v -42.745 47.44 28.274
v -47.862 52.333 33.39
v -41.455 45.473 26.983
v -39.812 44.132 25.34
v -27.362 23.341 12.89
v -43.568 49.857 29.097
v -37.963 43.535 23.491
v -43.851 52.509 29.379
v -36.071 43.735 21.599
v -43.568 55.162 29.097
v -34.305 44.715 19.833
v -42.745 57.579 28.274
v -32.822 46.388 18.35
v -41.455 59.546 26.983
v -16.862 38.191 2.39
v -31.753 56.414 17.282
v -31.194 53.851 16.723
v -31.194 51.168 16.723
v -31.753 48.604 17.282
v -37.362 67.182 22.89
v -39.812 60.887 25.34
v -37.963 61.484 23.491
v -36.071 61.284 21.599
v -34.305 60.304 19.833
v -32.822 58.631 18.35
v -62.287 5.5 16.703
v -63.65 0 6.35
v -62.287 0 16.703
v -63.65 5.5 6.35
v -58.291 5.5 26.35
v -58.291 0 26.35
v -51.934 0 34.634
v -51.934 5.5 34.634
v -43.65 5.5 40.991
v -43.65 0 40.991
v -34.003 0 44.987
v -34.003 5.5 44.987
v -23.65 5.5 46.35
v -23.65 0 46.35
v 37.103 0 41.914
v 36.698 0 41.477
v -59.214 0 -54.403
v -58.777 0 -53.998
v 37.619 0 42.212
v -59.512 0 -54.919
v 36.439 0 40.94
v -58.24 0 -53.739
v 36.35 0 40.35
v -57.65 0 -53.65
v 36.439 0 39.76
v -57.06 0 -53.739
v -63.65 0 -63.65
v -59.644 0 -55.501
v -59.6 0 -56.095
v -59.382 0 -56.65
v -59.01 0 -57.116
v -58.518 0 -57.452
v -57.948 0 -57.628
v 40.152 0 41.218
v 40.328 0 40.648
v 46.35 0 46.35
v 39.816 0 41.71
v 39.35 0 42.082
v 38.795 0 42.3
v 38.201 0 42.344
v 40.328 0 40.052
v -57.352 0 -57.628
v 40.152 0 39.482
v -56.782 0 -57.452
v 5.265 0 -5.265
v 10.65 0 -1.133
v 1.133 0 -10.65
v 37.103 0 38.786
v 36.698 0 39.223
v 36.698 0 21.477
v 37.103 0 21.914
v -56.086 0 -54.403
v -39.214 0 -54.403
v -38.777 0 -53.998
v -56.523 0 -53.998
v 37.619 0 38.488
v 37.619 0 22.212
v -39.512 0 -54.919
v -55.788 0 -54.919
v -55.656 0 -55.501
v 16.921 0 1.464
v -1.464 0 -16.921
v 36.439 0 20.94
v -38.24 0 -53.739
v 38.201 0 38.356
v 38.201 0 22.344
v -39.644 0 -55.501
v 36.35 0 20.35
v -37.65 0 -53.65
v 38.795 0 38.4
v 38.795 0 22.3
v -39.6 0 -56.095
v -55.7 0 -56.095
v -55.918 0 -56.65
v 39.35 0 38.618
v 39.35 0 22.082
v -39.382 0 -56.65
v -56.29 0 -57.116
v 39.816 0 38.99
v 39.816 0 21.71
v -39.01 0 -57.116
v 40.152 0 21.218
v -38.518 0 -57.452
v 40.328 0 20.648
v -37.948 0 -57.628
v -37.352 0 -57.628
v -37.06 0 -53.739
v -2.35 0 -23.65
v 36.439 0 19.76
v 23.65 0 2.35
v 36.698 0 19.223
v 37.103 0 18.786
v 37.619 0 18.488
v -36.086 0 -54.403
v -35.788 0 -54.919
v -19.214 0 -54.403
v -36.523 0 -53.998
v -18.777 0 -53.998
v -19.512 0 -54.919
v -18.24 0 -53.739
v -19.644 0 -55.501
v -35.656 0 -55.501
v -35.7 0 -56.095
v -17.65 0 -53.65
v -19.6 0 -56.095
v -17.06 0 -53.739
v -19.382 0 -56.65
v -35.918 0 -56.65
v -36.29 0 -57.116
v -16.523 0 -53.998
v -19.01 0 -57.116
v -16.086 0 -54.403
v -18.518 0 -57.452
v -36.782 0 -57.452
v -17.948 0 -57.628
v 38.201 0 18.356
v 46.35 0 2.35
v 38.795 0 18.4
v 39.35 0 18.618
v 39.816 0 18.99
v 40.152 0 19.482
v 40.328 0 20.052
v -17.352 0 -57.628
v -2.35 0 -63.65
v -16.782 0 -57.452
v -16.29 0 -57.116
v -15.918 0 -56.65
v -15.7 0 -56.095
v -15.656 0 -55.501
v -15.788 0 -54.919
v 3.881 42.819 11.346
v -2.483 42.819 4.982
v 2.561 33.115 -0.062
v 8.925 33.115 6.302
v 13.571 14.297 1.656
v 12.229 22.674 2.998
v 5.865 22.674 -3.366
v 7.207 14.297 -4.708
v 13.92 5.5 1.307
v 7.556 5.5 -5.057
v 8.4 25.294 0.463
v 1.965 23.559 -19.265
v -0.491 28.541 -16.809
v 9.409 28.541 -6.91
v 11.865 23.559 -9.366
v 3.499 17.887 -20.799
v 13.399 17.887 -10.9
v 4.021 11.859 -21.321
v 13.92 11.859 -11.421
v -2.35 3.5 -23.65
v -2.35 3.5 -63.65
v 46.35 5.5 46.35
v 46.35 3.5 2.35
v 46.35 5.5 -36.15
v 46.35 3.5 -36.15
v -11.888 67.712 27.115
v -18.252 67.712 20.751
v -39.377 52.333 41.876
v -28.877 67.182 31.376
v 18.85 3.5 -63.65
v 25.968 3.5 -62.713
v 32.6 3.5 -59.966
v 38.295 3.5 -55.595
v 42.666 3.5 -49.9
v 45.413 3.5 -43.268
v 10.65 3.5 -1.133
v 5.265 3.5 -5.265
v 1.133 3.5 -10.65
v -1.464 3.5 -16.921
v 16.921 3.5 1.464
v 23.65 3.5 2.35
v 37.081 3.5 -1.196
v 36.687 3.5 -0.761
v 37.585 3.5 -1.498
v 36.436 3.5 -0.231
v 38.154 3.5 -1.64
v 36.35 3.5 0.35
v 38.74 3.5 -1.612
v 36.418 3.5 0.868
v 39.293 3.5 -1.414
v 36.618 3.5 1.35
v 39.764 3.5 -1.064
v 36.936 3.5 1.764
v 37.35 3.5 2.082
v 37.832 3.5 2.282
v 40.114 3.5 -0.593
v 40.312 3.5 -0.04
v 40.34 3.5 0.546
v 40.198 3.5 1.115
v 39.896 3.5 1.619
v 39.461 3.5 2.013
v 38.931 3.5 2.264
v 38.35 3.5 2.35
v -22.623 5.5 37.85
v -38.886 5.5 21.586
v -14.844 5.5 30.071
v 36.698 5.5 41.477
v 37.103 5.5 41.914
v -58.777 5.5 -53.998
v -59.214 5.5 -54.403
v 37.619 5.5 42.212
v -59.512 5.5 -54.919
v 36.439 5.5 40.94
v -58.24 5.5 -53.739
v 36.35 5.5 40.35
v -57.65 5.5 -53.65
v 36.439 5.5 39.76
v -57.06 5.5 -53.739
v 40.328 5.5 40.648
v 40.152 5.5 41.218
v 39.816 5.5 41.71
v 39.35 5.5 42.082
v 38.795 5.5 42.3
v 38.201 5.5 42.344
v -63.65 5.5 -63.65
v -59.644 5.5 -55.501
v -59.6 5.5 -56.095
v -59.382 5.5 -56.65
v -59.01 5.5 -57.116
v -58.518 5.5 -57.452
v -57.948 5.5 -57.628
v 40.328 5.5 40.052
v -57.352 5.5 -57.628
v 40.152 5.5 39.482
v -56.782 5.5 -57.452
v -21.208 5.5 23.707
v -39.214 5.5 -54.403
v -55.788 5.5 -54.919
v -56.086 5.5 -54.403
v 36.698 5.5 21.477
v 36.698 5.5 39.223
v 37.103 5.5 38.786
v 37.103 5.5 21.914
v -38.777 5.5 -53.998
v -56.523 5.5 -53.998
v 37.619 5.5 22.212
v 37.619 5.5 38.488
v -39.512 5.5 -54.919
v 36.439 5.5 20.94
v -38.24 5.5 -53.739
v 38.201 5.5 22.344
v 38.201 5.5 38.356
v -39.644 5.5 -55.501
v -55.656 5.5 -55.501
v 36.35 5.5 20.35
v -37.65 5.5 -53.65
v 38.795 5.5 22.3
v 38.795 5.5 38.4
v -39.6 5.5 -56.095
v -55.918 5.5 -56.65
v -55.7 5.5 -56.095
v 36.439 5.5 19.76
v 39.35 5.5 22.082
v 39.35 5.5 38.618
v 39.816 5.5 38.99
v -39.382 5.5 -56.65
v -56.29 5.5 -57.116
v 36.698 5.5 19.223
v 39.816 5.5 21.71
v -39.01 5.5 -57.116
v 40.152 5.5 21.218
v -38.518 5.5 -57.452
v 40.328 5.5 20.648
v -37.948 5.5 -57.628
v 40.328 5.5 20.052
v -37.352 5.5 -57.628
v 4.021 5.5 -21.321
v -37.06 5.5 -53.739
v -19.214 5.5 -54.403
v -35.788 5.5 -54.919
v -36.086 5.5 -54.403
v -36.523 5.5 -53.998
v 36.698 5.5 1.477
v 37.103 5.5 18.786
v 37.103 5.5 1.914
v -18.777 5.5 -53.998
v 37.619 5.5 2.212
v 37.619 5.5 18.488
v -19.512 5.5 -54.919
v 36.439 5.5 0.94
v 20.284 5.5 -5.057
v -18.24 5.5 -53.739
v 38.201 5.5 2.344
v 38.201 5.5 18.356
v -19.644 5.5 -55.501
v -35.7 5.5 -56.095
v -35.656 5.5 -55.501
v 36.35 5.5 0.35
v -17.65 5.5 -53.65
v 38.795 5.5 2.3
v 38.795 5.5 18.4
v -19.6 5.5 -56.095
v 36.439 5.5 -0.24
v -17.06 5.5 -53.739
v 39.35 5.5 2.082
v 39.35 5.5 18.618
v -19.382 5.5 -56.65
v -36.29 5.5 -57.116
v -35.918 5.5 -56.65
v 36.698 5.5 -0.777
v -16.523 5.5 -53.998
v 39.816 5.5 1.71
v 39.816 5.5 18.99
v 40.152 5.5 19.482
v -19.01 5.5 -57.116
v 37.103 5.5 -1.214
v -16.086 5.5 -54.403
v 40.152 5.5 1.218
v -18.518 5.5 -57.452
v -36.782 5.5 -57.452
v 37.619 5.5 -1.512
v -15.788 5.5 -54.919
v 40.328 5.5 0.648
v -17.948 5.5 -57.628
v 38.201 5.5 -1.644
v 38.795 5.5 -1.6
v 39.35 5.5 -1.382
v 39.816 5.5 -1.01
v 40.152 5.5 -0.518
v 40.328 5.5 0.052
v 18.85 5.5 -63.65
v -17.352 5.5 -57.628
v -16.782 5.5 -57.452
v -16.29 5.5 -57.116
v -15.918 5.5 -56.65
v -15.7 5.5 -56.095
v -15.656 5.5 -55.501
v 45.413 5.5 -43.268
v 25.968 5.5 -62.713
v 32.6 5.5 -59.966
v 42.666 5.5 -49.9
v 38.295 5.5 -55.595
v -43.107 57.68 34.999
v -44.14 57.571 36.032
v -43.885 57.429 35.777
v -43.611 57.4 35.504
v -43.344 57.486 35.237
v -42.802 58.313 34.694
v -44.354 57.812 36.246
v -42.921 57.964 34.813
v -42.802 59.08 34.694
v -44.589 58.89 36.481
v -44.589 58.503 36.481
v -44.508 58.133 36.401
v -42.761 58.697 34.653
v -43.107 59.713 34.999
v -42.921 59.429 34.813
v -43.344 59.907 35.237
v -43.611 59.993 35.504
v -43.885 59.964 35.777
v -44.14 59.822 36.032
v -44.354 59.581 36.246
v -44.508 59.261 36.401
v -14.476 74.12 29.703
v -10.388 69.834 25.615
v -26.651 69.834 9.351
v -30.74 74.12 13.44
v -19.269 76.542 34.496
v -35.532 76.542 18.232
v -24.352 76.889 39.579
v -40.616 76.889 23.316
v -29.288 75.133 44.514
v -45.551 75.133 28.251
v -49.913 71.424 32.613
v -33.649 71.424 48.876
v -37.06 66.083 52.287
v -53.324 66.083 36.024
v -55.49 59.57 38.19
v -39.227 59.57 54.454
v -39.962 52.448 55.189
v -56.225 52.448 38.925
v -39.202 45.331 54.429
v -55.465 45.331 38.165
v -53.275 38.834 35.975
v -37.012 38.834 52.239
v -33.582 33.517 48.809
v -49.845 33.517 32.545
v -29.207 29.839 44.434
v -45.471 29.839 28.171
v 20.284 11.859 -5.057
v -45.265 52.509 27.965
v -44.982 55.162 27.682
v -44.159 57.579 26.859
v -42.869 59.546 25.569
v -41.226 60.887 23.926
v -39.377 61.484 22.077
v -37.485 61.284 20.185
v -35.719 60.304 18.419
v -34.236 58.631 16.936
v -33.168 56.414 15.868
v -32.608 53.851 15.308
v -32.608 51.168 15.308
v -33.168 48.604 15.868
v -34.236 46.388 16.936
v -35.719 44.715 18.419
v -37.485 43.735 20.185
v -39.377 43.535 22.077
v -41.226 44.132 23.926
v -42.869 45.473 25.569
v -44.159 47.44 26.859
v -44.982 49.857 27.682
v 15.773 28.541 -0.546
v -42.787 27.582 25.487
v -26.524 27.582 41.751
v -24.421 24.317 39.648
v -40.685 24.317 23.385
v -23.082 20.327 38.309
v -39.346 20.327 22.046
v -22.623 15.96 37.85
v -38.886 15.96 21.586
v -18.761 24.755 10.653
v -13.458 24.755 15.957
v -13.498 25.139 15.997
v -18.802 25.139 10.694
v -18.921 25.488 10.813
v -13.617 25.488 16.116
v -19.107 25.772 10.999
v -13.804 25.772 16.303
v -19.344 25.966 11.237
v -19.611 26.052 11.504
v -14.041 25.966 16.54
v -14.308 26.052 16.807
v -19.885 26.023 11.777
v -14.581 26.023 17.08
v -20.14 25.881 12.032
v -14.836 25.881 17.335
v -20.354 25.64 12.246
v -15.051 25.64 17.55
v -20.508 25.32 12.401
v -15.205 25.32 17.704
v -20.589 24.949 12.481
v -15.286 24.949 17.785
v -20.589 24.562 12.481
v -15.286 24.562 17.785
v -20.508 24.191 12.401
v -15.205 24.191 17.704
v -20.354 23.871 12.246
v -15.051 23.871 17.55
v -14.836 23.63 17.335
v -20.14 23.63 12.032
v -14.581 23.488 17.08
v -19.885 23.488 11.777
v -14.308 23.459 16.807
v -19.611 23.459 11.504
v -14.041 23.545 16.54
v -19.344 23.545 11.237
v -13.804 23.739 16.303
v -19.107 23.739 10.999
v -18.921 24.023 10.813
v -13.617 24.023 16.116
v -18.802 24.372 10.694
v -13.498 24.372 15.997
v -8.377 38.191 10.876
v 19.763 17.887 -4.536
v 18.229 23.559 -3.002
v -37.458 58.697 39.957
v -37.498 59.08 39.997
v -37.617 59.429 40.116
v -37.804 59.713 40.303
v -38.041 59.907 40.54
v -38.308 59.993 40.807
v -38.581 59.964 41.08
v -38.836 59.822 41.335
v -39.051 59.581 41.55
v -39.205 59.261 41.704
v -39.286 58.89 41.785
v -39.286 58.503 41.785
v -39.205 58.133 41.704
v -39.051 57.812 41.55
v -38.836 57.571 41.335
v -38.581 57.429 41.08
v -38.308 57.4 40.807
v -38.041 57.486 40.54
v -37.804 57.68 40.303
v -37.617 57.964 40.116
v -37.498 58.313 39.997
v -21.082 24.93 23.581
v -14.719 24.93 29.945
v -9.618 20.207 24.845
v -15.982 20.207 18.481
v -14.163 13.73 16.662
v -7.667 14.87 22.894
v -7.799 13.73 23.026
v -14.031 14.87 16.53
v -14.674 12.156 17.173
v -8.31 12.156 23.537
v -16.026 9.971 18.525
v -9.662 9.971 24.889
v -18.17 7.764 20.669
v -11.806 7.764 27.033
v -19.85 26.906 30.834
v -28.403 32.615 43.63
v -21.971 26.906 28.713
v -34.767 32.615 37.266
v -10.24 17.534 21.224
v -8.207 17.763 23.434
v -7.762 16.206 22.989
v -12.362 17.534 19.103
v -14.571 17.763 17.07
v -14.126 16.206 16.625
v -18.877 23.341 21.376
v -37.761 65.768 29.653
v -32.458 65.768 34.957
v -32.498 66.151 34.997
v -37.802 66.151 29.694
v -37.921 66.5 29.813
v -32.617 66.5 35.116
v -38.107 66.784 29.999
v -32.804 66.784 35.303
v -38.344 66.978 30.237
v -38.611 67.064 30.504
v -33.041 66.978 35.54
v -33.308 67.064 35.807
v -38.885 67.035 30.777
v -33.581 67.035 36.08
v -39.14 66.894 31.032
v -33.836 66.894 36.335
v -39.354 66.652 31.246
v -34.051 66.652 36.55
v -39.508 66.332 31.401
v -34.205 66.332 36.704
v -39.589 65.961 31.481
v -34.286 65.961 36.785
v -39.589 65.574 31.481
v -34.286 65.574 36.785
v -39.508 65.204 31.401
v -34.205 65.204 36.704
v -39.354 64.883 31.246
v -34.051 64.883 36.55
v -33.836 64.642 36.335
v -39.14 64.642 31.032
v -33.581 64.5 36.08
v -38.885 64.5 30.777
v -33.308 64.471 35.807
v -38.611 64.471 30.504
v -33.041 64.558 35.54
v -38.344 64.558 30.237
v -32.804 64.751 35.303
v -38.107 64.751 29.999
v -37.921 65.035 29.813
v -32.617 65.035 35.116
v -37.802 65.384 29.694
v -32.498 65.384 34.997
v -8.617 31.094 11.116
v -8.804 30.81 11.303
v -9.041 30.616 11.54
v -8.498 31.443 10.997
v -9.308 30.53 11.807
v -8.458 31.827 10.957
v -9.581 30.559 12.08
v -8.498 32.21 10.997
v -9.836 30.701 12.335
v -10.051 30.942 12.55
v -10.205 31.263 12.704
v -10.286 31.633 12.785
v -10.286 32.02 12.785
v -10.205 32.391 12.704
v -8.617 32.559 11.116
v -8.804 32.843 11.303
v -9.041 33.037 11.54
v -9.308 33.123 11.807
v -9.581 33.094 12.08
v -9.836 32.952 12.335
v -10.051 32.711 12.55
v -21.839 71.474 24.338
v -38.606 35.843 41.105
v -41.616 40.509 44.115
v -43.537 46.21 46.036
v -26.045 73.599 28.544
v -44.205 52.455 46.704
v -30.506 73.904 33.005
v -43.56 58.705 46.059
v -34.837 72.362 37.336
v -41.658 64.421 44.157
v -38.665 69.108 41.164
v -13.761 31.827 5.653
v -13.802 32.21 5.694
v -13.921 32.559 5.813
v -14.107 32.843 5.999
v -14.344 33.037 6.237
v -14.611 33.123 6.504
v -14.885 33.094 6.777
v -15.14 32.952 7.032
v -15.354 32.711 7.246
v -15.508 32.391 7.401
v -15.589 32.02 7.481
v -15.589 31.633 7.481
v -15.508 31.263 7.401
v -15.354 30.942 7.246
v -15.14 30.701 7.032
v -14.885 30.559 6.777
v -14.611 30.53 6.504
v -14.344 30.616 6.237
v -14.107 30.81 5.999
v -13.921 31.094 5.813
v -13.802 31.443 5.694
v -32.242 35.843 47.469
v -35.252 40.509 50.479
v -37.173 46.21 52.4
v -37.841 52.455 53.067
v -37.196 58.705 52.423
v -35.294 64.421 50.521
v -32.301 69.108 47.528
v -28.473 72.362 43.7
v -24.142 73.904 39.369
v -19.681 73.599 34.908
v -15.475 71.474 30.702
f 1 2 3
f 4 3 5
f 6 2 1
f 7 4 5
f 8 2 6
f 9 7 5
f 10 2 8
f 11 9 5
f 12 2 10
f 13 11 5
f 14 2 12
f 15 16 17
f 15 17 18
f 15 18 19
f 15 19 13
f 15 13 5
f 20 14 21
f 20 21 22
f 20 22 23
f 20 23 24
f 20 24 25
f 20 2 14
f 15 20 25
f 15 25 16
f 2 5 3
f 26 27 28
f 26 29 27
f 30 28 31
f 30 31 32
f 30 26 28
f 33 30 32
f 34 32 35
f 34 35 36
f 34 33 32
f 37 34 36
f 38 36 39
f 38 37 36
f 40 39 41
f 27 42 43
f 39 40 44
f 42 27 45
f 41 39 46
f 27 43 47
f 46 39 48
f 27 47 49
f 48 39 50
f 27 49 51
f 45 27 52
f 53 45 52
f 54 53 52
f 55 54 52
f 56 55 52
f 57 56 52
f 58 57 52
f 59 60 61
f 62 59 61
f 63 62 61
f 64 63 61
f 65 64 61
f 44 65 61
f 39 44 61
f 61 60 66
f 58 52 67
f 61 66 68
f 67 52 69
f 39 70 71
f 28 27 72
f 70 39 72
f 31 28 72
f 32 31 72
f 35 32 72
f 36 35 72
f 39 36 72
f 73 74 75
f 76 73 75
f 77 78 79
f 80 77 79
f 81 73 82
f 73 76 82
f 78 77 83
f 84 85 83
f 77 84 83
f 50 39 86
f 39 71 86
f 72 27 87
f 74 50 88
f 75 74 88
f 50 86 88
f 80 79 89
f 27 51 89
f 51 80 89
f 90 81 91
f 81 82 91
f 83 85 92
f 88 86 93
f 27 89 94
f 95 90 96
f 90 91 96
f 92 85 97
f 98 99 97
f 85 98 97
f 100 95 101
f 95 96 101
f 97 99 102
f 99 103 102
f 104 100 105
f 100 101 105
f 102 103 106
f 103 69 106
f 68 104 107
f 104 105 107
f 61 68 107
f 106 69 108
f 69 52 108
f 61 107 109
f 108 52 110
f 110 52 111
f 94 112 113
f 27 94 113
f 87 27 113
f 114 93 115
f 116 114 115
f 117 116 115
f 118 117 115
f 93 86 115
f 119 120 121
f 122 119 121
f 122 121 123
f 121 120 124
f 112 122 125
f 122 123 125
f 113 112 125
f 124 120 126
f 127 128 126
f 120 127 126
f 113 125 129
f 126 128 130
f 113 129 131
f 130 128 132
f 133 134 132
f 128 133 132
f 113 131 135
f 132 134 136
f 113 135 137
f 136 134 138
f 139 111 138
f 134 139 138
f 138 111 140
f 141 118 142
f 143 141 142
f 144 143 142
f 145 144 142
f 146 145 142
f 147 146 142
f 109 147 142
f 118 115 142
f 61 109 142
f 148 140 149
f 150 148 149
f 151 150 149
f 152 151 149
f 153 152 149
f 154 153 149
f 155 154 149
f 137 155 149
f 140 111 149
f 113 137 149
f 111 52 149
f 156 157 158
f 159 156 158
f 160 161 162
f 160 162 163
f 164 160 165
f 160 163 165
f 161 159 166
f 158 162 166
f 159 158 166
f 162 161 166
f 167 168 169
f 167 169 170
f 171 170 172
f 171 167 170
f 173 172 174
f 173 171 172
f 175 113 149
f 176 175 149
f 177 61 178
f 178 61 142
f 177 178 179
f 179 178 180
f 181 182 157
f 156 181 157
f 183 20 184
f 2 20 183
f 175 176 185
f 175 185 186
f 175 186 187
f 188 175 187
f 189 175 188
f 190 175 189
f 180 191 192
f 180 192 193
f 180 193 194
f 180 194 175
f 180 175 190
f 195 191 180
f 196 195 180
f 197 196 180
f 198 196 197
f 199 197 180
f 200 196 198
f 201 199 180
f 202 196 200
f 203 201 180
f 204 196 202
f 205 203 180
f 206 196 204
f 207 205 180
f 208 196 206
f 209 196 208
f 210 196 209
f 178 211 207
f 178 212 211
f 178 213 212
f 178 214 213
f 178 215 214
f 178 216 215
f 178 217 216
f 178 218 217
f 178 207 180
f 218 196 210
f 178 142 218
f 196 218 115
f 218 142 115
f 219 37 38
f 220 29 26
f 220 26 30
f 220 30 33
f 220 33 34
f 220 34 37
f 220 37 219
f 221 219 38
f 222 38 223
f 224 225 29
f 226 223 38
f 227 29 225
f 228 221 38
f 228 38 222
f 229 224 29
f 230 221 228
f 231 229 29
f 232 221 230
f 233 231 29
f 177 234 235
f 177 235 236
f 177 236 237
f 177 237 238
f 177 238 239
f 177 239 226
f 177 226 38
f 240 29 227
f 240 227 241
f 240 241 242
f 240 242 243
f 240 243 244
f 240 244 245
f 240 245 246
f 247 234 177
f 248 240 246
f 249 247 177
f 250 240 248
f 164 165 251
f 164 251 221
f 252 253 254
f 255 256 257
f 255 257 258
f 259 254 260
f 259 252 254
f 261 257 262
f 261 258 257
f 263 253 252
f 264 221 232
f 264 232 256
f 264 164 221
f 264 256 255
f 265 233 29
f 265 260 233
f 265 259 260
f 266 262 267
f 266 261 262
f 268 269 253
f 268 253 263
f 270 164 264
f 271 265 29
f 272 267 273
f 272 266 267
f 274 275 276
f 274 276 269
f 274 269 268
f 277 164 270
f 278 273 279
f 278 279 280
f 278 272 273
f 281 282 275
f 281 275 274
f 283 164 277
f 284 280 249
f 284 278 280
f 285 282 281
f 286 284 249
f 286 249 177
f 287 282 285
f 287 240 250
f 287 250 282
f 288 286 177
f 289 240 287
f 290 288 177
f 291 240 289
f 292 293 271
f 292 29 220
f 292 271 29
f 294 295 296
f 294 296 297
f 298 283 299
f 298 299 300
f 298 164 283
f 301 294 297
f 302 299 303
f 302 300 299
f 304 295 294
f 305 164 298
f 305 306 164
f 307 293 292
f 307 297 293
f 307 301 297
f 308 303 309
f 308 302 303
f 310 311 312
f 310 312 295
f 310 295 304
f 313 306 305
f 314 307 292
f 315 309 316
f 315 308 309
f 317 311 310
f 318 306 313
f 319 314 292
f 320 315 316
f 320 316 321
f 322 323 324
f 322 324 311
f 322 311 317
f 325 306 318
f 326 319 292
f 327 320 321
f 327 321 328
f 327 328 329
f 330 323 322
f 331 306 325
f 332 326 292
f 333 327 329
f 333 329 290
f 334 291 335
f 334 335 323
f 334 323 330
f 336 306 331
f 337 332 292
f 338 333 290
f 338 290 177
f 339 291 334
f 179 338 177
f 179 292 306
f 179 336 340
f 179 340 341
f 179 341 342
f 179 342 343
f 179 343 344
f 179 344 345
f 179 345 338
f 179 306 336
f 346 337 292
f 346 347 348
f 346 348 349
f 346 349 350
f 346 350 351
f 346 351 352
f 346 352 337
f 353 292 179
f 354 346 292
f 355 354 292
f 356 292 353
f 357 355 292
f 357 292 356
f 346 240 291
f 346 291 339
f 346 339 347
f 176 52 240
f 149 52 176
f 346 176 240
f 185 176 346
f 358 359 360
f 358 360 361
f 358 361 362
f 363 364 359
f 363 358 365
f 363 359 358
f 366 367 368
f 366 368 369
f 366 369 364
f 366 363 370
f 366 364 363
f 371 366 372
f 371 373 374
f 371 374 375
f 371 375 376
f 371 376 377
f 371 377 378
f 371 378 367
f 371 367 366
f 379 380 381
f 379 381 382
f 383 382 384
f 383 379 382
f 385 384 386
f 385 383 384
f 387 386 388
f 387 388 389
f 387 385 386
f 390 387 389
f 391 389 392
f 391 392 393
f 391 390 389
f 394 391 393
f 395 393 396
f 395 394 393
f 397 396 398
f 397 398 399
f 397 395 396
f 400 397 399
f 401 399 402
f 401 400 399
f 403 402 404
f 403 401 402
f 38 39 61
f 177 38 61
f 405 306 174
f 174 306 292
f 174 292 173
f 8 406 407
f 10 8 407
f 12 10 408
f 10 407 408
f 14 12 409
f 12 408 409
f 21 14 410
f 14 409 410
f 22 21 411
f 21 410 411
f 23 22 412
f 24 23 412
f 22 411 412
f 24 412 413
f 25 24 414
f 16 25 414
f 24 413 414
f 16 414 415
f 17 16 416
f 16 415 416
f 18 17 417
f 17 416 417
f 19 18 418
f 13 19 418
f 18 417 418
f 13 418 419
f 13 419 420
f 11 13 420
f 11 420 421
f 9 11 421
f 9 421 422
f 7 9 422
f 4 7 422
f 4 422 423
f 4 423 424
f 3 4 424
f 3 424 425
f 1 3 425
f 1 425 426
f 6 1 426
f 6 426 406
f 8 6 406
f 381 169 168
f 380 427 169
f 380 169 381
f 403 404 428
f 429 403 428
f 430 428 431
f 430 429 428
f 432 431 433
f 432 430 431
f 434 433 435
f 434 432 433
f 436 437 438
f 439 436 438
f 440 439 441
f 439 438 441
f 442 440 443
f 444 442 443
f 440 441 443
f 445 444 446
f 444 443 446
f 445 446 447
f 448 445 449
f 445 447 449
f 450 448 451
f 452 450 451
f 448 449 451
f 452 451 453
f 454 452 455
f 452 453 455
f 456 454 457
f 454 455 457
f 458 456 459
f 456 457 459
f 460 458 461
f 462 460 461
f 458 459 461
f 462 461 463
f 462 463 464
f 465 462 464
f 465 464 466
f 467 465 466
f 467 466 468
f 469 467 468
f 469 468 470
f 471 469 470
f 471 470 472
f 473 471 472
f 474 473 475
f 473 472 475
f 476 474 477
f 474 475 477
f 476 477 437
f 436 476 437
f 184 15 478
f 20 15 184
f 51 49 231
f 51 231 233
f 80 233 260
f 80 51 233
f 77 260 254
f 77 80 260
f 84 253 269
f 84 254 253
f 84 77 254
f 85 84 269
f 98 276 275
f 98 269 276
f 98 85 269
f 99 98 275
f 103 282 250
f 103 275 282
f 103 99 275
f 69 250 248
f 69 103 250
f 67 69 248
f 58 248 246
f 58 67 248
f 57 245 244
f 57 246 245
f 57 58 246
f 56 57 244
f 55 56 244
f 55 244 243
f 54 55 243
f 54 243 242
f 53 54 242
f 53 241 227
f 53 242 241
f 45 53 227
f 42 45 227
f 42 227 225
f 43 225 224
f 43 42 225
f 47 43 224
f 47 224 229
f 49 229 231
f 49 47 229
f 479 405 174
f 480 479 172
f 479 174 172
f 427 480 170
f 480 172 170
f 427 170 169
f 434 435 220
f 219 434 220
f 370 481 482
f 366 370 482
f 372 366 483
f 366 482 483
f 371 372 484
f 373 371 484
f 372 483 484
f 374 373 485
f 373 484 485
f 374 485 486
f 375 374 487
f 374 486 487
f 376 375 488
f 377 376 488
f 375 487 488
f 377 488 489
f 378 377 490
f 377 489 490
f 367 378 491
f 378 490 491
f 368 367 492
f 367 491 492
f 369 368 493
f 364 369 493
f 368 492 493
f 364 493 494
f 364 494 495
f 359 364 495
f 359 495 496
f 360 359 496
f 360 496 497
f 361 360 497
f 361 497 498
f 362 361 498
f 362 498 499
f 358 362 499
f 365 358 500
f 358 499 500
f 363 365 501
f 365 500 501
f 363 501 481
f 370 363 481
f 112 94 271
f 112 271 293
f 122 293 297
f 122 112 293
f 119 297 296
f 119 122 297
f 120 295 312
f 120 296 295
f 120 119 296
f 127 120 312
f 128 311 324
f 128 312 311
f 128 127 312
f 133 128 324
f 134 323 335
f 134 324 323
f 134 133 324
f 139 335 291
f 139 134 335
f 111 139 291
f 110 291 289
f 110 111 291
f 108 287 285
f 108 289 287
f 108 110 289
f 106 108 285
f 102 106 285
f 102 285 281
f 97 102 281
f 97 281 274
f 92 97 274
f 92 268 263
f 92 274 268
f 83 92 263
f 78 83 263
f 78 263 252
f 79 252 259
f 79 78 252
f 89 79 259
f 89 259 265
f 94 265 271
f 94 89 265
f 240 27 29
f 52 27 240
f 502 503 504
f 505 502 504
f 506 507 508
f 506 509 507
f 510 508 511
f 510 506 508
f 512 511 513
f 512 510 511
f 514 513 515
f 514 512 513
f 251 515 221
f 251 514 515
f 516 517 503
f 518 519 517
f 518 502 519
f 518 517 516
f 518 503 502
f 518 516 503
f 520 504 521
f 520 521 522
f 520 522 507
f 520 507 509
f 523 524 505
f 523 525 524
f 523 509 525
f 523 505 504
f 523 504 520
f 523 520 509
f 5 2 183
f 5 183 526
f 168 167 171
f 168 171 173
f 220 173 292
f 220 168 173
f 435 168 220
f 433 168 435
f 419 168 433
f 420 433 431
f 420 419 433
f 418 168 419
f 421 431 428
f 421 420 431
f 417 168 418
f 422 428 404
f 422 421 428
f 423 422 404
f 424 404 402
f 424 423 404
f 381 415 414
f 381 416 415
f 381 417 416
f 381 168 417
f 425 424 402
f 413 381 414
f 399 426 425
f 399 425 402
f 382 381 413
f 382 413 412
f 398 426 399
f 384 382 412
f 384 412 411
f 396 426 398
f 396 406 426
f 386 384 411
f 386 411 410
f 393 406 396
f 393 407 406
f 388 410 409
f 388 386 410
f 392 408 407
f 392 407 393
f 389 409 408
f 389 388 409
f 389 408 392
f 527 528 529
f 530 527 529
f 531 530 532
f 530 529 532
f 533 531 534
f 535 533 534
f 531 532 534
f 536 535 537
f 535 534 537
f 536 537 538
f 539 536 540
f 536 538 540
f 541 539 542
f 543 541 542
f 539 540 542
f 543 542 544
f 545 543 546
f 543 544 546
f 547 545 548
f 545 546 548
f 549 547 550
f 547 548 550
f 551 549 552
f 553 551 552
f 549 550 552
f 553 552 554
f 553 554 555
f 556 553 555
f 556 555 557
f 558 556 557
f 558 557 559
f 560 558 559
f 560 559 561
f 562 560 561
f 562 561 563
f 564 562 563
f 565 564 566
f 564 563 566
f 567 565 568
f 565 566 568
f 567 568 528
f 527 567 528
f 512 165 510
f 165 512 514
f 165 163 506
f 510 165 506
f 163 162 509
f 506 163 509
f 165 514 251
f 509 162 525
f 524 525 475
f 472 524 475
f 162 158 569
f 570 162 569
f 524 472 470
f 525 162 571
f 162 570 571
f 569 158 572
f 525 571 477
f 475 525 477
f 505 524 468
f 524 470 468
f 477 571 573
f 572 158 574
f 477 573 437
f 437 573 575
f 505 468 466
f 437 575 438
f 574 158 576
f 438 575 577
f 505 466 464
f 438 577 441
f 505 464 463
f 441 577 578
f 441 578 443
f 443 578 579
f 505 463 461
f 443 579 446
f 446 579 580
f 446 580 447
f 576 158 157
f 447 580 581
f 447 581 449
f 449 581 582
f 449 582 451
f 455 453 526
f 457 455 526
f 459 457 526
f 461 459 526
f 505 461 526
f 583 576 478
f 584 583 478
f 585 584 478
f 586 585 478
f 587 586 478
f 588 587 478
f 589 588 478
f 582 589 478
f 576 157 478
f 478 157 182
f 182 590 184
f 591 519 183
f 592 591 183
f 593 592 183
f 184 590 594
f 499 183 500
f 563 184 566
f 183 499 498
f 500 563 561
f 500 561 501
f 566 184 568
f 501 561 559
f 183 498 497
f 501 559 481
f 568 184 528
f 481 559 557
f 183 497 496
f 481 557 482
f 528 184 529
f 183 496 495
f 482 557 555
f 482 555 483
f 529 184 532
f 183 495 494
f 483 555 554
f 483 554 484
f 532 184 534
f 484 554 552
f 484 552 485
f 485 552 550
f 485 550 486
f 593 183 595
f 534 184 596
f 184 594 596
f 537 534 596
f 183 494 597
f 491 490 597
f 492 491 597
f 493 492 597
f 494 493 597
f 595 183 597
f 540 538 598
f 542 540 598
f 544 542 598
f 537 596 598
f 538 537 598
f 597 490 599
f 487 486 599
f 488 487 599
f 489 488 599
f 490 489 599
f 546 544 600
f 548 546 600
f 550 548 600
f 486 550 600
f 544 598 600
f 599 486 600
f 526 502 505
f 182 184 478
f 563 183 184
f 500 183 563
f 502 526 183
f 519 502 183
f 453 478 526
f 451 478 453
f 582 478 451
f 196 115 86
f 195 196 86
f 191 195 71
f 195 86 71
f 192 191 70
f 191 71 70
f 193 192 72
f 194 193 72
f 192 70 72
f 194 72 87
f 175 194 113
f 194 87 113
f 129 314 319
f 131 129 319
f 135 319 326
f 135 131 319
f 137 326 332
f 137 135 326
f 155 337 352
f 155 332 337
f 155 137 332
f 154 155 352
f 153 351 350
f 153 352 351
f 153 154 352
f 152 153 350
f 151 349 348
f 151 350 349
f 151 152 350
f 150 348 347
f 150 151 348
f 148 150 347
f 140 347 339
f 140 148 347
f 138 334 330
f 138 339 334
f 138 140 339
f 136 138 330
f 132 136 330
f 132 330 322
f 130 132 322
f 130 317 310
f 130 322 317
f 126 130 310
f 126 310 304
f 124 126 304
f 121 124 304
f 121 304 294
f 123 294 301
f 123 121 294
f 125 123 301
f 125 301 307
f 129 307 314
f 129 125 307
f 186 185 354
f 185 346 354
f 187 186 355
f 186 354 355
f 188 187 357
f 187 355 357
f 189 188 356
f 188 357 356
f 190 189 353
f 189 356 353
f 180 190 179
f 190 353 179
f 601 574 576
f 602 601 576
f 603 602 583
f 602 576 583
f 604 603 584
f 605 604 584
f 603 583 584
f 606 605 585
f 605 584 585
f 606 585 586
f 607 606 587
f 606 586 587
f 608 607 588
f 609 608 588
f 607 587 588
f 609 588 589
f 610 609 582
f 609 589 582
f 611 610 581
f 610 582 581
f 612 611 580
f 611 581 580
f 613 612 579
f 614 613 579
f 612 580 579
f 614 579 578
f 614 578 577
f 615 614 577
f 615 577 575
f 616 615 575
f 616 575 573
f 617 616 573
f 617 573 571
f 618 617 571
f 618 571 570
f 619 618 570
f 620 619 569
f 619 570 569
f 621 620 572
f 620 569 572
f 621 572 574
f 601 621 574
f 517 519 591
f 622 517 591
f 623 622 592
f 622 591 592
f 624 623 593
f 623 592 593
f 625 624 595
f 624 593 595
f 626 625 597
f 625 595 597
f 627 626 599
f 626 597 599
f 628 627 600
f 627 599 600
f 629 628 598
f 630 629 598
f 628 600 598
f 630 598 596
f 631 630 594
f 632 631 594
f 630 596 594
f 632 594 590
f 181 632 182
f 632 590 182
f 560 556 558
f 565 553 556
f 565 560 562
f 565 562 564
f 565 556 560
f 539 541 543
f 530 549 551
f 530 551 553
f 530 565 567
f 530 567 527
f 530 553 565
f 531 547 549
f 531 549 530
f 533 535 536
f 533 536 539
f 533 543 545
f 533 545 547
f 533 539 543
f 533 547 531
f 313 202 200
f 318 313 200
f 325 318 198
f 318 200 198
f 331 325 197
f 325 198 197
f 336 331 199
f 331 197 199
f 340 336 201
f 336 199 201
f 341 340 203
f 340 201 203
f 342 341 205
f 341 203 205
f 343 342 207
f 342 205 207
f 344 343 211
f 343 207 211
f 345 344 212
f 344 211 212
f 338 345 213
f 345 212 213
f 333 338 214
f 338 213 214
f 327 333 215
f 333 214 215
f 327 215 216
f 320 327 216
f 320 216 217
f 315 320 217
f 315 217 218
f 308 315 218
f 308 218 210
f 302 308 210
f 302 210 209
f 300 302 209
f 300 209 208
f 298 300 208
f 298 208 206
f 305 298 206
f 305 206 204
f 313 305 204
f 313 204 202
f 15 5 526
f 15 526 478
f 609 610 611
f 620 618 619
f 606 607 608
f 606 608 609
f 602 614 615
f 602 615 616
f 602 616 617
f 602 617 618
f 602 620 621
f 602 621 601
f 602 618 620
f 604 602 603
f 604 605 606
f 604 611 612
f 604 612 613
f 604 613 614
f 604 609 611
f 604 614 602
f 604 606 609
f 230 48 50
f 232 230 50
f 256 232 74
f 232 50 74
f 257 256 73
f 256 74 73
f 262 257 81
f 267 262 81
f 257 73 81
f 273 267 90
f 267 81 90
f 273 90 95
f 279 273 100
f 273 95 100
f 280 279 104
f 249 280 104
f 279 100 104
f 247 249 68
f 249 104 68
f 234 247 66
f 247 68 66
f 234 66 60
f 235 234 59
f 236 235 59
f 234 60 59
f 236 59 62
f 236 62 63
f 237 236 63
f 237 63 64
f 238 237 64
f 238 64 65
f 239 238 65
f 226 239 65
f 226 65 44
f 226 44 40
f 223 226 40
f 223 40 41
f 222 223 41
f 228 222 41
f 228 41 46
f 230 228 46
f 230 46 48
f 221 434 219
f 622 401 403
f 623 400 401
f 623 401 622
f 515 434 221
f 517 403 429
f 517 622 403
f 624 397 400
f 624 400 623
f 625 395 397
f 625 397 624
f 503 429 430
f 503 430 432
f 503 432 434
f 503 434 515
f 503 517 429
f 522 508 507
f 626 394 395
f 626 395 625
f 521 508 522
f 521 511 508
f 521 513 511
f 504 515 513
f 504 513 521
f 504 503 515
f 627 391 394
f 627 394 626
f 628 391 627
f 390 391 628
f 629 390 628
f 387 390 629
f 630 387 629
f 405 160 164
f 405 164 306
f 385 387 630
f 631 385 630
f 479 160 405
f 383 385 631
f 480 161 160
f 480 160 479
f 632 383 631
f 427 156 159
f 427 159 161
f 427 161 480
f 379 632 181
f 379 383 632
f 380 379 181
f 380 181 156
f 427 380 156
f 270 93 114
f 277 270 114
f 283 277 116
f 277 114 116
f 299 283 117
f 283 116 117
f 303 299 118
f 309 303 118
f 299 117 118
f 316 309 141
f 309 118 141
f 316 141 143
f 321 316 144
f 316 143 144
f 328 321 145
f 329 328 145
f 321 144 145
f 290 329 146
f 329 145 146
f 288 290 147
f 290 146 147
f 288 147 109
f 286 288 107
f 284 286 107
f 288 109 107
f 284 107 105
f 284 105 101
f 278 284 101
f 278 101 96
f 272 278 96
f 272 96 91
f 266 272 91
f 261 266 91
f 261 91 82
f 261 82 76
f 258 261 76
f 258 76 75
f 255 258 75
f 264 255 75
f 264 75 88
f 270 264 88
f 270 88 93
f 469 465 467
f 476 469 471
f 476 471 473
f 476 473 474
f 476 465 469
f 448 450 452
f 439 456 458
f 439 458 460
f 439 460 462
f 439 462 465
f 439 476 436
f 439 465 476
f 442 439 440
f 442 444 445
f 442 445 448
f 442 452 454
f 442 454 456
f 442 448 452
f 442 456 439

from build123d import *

# Parameters (mm, degrees)
SKETCH2_W                       = 110
SKETCH2_H                       = 110
BOSS_EXTRUDE1_DEPTH             = 5.5
BOSS_EXTRUDE2_DEPTH             = 14
CUT_EXTRUDE5_REACH              = 110.823
SKETCH9_R                       = 1.3
CUT_EXTRUDE6_DEPTH              = 7.5
CUT_EXTRUDE9_REACH              = 109.547
SKETCH11_R                      = 9
BOSS_EXTRUDE7_DEPTH             = 9
BOSS_EXTRUDE7_DIRECTION_2_REACH = 119.904
BOSS_EXTRUDE10_DEPTH            = 9
CUT_EXTRUDE10_DEPTH             = 3.5
F_4_0_4_DIAMETER_HOLE3_D        = 4
FILLET1_R                       = 27.5
FILLET2_R                       = 40


with BuildPart() as part:
    # Sketch2 → Boss-Extrude1 (new body)
    with BuildSketch(Plane(origin=(0, 0, 0), x_dir=(1, 0, 0), z_dir=(0, 1, 0))):
        with Locations((-8.65, 8.65)):
            Rectangle(SKETCH2_W, SKETCH2_H)
    extrude(amount=BOSS_EXTRUDE1_DEPTH)

    # Sketch7 → Boss-Extrude2 (add)
    with BuildSketch(Plane(origin=(-8.65, 0, -8.65), x_dir=(-0.7071067811865479, 0, 0.7071067811865471), z_dir=(-0.7071067811865471, 0, -0.7071067811865479))):
        with BuildLine():
            Line((39.760240188, 5.5), (39.760240188, 15.95953406))
            ThreePointArc((39.760240188, 15.95953406), (42.812638822, 25.987954346), (50.934597235, 32.615181699))
            ThreePointArc((50.934597235, 32.615181699), (60.680796502, 64.420514285), (27.578950135, 67.712223286))
            Line((27.578950135, 67.712223286), (-10.597023433, 29.536249718))
            ThreePointArc((-10.597023433, 29.536249718), (-16.016342216, 21.425665997), (-17.919353903, 11.858580188))
            Line((-17.919353903, 11.858580188), (-17.919353903, 5.5))
            Line((-17.919353903, 5.5), (39.760240188, 5.5))
        make_face()
    extrude(amount=-BOSS_EXTRUDE2_DEPTH)

    # Sketch8 → Cut-Extrude5 (cut, up to next)
    with BuildSketch(Plane(origin=(-7.235786438, 0, -7.235786438), x_dir=(-0.7071067811865479, 0, 0.7071067811865471), z_dir=(-0.7071067811865471, 0, -0.7071067811865479)), mode=Mode.PRIVATE) as cut_extrude5_sk1:
        Polygon((13.613591207, 38.190515171), (42.604969235, 67.1818932), (57.45421164, 52.332650795), (28.462833611, 23.341272767), align=None)
    cut_extrude5_tool1 = extrude(cut_extrude5_sk1.sketch, amount=-CUT_EXTRUDE5_REACH, mode=Mode.PRIVATE) & part.part
    add(cut_extrude5_tool1.solids().sort_by_distance((-32.362049, 45.261583, 17.890476))[0], mode=Mode.SUBTRACT)

    # Sketch9 → Cut-Extrude6 (cut)
    with BuildSketch(Plane(origin=(1.249494937, 0, 1.249494937), x_dir=(0.7071067811865479, 0, -0.7071067811865471), z_dir=(0.7071067811865471, 0, 0.7071067811865479))):
        with Locations((-48.968930266, 65.767679638)):
            Circle(SKETCH9_R)
        with Locations((-56.039998078, 58.696611826)):
            Circle(SKETCH9_R)
        with Locations((-22.098872581, 24.755486329)):
            Circle(SKETCH9_R)
        with Locations((-15.027804769, 31.826554141)):
            Circle(SKETCH9_R)
    extrude(amount=-CUT_EXTRUDE6_DEPTH, mode=Mode.SUBTRACT)

    # Sketch11 → Cut-Extrude9 (cut, up to next)
    with BuildSketch(Plane(origin=(-8.65, 0, -8.65), x_dir=(-0.7071067811865479, 0, 0.7071067811865471), z_dir=(-0.7071067811865471, 0, -0.7071067811865479)), mode=Mode.PRIVATE) as cut_extrude9_sk1:
        with Locations((42.781745931, 52.50942749)):
            Circle(SKETCH11_R)
    cut_extrude9_tool1 = extrude(cut_extrude9_sk1.sketch, amount=-CUT_EXTRUDE9_REACH, mode=Mode.PRIVATE) & part.part
    add(cut_extrude9_tool1.solids().sort_by_distance((-38.901263, 52.509427, 21.601263))[0], mode=Mode.SUBTRACT)

    # Sketch17 → Boss-Extrude7 (add)
    with BuildSketch(Plane(origin=(1.249494937, 0, 1.249494937), x_dir=(0.7071067811865479, 0, -0.7071067811865471), z_dir=(0.7071067811865471, 0, 0.7071067811865479))):
        with BuildLine():
            Line((11.538994713, 28.541175194), (-25.457629791, 69.83354363))
            ThreePointArc((-25.457629791, 69.83354363), (-63.178338442, 66.082526396), (-52.072204394, 29.839240426))
            ThreePointArc((-52.072204394, 29.839240426), (-45.303905717, 24.316550965), (-42.760240188, 15.95953406))
            Line((-42.760240188, 15.95953406), (-42.760240188, 5.5))
            Line((-42.760240188, 5.5), (-39.760240188, 5.5))
            Line((-39.760240188, 5.5), (-39.760240188, 15.95953406))
            ThreePointArc((-39.760240188, 15.95953406), (-42.812638822, 25.987954346), (-50.934597235, 32.615181699))
            ThreePointArc((-50.934597235, 32.615181699), (-60.680796502, 64.420514285), (-27.578950135, 67.712223286))
            Line((-27.578950135, 67.712223286), (9.30583444, 26.537928118))
            ThreePointArc((9.30583444, 26.537928118), (13.46810778, 19.716615191), (14.919353903, 11.858580188))
            Line((14.919353903, 11.858580188), (14.919353903, 5.5))
            Line((14.919353903, 5.5), (17.919353903, 5.5))
            Line((17.919353903, 5.5), (17.919353903, 11.858580188))
            ThreePointArc((17.919353903, 11.858580188), (16.26984662, 20.78911712), (11.538994713, 28.541175194))
        make_face()
    extrude(amount=BOSS_EXTRUDE7_DEPTH)

    # Boss-Extrude7 direction 2: up to this face of the body (flat: up to its plane)
    boss_extrude7_direction_2_end = Plane(part.part.faces().sort_by_distance((-25.67440007, 34.90069961, 8.37440007))[0])
    # Sketch17 → Boss-Extrude7 direction 2 (add, up to the picked face)
    with BuildSketch(Plane(origin=(1.249494937, 0, 1.249494937), x_dir=(0.7071067811865479, 0, -0.7071067811865471), z_dir=(0.7071067811865471, 0, 0.7071067811865479)), mode=Mode.PRIVATE) as boss_extrude7_direction_2_sk1:
        with BuildLine():
            Line((11.538994713, 28.541175194), (-25.457629791, 69.83354363))
            ThreePointArc((-25.457629791, 69.83354363), (-63.178338442, 66.082526396), (-52.072204394, 29.839240426))
            ThreePointArc((-52.072204394, 29.839240426), (-45.303905717, 24.316550965), (-42.760240188, 15.95953406))
            Line((-42.760240188, 15.95953406), (-42.760240188, 5.5))
            Line((-42.760240188, 5.5), (-39.760240188, 5.5))
            Line((-39.760240188, 5.5), (-39.760240188, 15.95953406))
            ThreePointArc((-39.760240188, 15.95953406), (-42.812638822, 25.987954346), (-50.934597235, 32.615181699))
            ThreePointArc((-50.934597235, 32.615181699), (-60.680796502, 64.420514285), (-27.578950135, 67.712223286))
            Line((-27.578950135, 67.712223286), (9.30583444, 26.537928118))
            ThreePointArc((9.30583444, 26.537928118), (13.46810778, 19.716615191), (14.919353903, 11.858580188))
            Line((14.919353903, 11.858580188), (14.919353903, 5.5))
            Line((14.919353903, 5.5), (17.919353903, 5.5))
            Line((17.919353903, 5.5), (17.919353903, 11.858580188))
            ThreePointArc((17.919353903, 11.858580188), (16.26984662, 20.78911712), (11.538994713, 28.541175194))
        make_face()
    boss_extrude7_direction_2_tool1 = split(extrude(boss_extrude7_direction_2_sk1.sketch, amount=-BOSS_EXTRUDE7_DIRECTION_2_REACH, mode=Mode.PRIVATE), bisect_by=boss_extrude7_direction_2_end, keep=Keep.BOTH, mode=Mode.PRIVATE)
    add(boss_extrude7_direction_2_tool1.solids().sort_by(Axis((-4.257288, 48.445096, 6.756277), (-0.7071067811865471, 0, -0.7071067811865479)))[0])

    # Sketch25 → Boss-Extrude10 (add)
    with BuildSketch(Plane(origin=(1.249494937, 0, 1.249494937), x_dir=(0.7071067811865479, 0, -0.7071067811865471), z_dir=(0.7071067811865471, 0, 0.7071067811865479))):
        with BuildLine():
            ThreePointArc((-50.934597235, 32.615181699), (-42.812638822, 25.987954346), (-39.760240188, 15.95953406))
            Line((-39.760240188, 15.95953406), (-39.760240188, 5.5))
            Line((-39.760240188, 5.5), (-31.760240188, 5.5))
            add(Edge.make_bspline(
                [(-50.934597235, 32.615181699), (-42.286107378, 29.070948228), (-3.49892217, 18.530427319), (-31.760240188, 5.5)],
                knots=[0, 0, 0, 0, 1, 1, 1, 1], degree=3))
        make_face()
        with BuildLine():
            add(Edge.make_bspline(
                [(-5.279129206, 42.819047964), (9.40428973, 26.428022984), (8.919353903, 5.5)],
                knots=[0, 0, 0, 1, 1, 1], degree=2))
            Line((8.919353903, 5.5), (14.919353903, 5.5))
            Line((14.919353903, 5.5), (14.919353903, 11.858580188))
            ThreePointArc((14.919353903, 11.858580188), (13.46810778, 19.716615191), (9.30583444, 26.537928118))
            Line((9.30583444, 26.537928118), (-5.279129206, 42.819047964))
        make_face()
    extrude(amount=BOSS_EXTRUDE10_DEPTH)

    # Sketch26 → Cut-Extrude10 (cut)
    with BuildSketch(Plane.XZ):
        with BuildLine():
            Line((-2.35, -23.65), (-2.35, -63.65))
            Line((-2.35, -63.65), (46.35, -63.65))
            Line((46.35, -63.65), (46.35, 2.35))
            Line((46.35, 2.35), (23.65, 2.35))
            ThreePointArc((23.65, 2.35), (5.265223689, -5.265223689), (-2.35, -23.65))
        make_face()
    extrude(amount=-CUT_EXTRUDE10_DEPTH, mode=Mode.SUBTRACT)

    # Ø4.0 (4) Diameter Hole3 (through all)
    with Locations(Plane(origin=(0, 5.5, 0), x_dir=(1, 0, 0), z_dir=(0, 1, 0))):
        with Locations((38.35, -40.35), (38.35, -20.35), (38.35, -0.35)):
            f_4_0_4_diameter_hole3 = Hole(F_4_0_4_DIAMETER_HOLE3_D / 2)

    # Mirror1: Ø4.0 (4) Diameter Hole3 across plane
    add(f_4_0_4_diameter_hole3.mirror(Plane(origin=(-8.65, 0, -8.65), x_dir=(-0.7071067811865481, 0, 0.707106781186547), z_dir=(-0.7071067811865472, 0, -0.707106781186548))), mode=Mode.SUBTRACT)

    # Fillet1
    fillet1_edges = [part.edges().sort_by_distance(p)[0] for p in [
        (46.35, 4.5, -63.65),
    ]]
    fillet(fillet1_edges, radius=FILLET1_R)

    # Fillet2
    fillet2_edges = [part.edges().sort_by_distance(p)[0] for p in [
        (-63.65, 2.75, 46.35),
    ]]
    fillet(fillet2_edges, radius=FILLET2_R)


solid = part.part
